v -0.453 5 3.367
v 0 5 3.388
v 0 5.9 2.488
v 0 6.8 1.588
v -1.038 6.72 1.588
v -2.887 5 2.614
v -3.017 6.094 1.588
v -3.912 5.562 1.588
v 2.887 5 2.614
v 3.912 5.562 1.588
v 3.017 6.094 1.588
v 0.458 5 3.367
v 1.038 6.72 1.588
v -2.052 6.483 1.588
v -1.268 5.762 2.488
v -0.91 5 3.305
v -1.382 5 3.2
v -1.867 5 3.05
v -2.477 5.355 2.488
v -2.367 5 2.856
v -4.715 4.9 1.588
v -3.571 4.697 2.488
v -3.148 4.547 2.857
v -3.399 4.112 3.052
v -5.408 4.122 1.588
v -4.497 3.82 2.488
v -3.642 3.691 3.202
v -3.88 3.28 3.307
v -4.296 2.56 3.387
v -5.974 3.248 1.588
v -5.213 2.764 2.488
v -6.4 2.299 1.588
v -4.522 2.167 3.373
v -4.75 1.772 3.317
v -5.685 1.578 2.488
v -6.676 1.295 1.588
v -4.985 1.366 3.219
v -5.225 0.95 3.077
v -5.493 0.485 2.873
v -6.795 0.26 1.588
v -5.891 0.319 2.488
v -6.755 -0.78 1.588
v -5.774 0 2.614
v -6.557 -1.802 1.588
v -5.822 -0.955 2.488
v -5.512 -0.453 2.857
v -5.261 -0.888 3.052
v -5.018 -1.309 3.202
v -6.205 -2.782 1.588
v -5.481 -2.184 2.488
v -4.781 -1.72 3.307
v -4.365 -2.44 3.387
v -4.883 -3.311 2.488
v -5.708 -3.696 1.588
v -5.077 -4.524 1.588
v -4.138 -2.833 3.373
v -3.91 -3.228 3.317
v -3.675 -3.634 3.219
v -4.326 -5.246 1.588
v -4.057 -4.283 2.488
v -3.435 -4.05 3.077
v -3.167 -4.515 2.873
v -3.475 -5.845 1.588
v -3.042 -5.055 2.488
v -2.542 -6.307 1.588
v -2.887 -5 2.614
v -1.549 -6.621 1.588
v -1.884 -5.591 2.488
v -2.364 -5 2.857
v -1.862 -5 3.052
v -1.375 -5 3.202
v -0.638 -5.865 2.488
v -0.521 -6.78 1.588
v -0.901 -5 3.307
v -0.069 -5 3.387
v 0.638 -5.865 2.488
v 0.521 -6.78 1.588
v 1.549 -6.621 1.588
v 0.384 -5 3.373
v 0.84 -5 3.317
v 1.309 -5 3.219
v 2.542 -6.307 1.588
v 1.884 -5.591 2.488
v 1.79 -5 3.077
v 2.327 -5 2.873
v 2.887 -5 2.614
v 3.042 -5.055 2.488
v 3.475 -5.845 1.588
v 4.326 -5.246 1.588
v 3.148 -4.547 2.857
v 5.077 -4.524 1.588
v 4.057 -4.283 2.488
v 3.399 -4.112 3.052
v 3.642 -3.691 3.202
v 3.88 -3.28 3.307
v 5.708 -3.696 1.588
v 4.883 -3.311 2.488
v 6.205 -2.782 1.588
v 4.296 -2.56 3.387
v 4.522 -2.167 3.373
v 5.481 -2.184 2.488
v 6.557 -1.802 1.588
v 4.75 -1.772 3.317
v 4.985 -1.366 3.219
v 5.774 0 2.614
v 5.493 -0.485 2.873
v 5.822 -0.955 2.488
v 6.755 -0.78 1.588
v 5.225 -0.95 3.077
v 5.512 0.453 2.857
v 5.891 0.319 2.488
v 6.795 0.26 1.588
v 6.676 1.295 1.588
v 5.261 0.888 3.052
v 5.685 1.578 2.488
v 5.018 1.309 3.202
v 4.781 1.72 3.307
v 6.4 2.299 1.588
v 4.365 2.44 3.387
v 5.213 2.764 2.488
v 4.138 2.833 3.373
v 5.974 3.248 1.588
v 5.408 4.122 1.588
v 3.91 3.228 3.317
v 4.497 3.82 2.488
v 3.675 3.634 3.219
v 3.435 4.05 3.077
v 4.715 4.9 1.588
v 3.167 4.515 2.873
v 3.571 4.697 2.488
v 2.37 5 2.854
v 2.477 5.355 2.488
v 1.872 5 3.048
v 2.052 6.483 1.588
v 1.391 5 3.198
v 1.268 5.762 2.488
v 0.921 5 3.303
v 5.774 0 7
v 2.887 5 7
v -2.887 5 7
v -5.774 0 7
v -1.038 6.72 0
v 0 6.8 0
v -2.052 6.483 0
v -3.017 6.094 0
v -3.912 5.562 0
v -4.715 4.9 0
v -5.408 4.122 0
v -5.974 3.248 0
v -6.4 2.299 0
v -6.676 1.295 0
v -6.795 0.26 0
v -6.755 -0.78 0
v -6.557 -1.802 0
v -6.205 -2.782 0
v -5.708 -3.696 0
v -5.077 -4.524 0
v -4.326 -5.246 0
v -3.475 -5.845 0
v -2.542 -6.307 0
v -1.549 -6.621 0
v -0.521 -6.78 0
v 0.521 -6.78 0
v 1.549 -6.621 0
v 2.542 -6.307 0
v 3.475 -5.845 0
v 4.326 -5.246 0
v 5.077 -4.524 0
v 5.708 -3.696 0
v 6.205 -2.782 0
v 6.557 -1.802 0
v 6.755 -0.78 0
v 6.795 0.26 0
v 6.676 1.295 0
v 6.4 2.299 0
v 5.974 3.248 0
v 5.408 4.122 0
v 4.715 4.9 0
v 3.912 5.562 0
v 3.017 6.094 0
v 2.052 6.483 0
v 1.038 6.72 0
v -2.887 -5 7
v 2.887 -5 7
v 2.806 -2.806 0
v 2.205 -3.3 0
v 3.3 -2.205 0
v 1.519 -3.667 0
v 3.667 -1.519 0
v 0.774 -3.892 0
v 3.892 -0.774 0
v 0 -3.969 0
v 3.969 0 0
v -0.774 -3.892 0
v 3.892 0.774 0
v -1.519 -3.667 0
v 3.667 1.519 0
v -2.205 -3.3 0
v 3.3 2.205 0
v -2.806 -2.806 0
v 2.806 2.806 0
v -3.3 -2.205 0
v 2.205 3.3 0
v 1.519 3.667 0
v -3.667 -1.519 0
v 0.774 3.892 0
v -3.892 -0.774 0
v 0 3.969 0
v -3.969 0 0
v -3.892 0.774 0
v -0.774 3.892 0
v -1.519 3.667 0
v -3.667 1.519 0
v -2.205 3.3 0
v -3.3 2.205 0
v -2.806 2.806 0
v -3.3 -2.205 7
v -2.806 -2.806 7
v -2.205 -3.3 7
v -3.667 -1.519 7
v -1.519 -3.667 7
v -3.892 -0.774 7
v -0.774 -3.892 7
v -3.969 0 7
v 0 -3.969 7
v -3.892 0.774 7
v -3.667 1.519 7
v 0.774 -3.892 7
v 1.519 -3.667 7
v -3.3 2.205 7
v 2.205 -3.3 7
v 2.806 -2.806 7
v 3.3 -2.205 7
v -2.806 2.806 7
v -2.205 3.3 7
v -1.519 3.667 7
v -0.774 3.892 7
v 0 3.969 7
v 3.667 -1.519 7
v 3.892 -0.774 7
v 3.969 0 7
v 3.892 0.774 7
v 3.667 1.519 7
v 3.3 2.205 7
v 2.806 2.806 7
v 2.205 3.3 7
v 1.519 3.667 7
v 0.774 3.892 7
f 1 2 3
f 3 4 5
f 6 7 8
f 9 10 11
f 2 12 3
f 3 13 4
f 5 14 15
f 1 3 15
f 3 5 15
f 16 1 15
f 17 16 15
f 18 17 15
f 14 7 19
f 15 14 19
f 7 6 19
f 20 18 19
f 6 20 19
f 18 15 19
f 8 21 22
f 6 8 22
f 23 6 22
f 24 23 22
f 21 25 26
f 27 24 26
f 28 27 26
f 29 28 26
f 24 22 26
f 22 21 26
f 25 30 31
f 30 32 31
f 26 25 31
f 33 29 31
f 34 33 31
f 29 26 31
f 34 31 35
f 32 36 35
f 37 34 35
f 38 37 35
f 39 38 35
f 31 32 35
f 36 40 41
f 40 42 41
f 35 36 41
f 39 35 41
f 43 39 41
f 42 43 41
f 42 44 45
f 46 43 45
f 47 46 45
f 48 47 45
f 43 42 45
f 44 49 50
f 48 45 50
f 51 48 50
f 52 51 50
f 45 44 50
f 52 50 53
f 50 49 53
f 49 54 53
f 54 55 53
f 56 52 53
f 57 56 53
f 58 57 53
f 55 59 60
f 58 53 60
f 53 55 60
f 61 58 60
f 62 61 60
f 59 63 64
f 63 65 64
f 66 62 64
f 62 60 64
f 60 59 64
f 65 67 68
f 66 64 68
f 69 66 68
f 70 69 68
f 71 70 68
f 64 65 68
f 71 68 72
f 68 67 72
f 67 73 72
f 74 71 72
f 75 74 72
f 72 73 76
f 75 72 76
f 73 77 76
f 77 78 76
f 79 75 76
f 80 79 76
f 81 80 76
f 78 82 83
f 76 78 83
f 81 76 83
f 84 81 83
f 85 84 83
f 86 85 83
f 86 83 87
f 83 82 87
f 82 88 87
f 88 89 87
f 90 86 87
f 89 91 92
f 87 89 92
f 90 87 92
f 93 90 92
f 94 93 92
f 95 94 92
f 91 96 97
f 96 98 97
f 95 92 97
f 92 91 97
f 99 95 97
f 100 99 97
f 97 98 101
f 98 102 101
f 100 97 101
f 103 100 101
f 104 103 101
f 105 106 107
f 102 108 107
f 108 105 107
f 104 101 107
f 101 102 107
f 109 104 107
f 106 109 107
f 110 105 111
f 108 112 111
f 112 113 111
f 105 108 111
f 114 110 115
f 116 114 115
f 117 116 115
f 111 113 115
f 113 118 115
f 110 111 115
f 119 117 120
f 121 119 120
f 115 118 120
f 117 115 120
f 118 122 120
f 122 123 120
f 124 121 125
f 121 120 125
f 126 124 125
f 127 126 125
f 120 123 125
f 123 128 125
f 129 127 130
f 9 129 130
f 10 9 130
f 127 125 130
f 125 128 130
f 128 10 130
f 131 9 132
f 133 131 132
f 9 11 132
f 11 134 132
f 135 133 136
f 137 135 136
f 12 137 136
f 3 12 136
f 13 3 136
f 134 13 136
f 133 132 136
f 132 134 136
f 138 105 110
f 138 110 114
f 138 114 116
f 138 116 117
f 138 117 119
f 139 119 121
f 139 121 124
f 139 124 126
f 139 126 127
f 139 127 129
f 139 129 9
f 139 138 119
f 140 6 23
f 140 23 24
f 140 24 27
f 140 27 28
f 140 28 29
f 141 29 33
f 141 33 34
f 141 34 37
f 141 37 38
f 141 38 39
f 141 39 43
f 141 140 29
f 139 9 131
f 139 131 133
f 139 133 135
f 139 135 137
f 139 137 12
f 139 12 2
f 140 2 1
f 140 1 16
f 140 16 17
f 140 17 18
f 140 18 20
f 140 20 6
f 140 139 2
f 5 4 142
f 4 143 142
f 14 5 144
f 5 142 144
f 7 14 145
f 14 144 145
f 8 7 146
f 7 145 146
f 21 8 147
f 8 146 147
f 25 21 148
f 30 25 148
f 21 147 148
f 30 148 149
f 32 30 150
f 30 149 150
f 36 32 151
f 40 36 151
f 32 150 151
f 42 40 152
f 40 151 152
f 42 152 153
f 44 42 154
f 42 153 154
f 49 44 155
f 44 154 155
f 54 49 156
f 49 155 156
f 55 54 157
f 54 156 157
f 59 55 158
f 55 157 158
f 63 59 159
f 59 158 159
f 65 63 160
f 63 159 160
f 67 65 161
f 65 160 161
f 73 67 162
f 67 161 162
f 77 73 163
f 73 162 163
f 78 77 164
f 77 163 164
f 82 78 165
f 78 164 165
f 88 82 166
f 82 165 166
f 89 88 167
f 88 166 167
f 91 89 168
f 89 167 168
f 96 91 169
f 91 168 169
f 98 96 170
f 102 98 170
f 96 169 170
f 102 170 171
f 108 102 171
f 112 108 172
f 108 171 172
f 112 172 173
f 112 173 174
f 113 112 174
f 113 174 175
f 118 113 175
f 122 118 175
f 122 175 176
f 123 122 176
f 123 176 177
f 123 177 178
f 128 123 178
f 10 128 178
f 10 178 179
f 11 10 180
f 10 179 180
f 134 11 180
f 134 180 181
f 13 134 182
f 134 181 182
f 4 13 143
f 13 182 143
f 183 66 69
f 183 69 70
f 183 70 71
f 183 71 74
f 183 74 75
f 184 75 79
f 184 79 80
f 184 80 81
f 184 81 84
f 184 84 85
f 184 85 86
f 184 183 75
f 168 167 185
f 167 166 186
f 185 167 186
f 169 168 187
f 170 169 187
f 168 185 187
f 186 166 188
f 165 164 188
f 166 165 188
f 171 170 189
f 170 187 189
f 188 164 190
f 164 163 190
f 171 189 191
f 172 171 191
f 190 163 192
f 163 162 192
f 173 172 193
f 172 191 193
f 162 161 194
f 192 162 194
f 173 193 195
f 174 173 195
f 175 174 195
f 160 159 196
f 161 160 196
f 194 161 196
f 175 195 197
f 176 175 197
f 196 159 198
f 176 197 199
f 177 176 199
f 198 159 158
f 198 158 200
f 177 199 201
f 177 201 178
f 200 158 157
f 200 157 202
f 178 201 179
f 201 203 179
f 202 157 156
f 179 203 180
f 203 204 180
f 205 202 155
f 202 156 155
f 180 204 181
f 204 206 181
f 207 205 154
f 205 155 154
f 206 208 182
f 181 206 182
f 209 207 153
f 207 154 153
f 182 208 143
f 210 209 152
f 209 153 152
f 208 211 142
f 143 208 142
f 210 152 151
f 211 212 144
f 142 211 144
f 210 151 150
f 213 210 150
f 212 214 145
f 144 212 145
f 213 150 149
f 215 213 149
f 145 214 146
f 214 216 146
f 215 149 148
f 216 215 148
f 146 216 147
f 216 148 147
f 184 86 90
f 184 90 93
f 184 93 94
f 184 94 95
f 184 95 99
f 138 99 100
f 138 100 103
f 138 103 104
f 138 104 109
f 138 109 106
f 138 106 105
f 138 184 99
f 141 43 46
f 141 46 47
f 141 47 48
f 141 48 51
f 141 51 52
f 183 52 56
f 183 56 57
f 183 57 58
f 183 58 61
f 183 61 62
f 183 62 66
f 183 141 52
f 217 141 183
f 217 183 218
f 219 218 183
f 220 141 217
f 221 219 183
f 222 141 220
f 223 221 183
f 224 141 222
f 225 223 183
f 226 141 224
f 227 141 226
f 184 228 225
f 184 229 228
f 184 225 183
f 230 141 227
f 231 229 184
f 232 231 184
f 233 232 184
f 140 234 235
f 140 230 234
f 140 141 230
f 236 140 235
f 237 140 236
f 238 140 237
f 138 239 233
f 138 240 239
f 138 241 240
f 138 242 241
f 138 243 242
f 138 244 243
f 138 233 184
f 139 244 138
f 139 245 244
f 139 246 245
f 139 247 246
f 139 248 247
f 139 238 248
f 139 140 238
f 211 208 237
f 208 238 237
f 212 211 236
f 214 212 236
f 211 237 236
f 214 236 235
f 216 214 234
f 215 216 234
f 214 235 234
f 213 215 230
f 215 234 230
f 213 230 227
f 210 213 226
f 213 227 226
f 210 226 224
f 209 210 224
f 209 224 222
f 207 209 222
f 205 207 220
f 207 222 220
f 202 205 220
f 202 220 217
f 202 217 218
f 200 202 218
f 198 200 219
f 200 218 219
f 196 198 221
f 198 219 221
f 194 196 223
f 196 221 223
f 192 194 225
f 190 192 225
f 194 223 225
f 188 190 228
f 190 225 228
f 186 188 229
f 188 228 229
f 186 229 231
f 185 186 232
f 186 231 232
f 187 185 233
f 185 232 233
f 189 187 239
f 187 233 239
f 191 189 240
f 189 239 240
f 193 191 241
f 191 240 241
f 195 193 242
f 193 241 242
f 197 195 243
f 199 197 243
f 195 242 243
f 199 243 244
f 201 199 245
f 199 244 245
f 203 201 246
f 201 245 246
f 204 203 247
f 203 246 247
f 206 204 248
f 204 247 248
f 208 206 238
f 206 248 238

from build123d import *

# Parameters (mm, degrees)
BOSS_EXTRUDE1_REACH = 9
SKETCH2_R           = 3.96875


with BuildPart() as part:
    # Sketch1 → Revolve1 (revolve)
    with BuildSketch(Plane(origin=(0, 0, 0), x_dir=(0, 0, -1), z_dir=(1, 0, 0))):
        Polygon((0, 3.96875), (-7, 3.96875), (-7, 4.7625), (-3.625, 4.7625), (-1.5875, 6.8), (0, 6.8), align=None)
    revolve(axis=Axis((0, 0, 0), (0, 0, 1)))

    # Sketch2 → Boss-Extrude1 (add, up to next)
    with BuildSketch(Plane.XY.offset(7), mode=Mode.PRIVATE) as boss_extrude1_sk1:
        Polygon((-2.886751346, 5), (-5.773502692, 0), (-2.886751346, -5), (2.886751346, -5), (5.773502692, 0), (2.886751346, 5), align=None)
        Circle(SKETCH2_R, mode=Mode.SUBTRACT)
    boss_extrude1_tool1 = extrude(boss_extrude1_sk1.sketch, amount=-BOSS_EXTRUDE1_REACH, mode=Mode.PRIVATE) - part.part
    add(boss_extrude1_tool1.solids().sort_by_distance((-4.197839, 2.423624, 7))[0])


solid = part.part
